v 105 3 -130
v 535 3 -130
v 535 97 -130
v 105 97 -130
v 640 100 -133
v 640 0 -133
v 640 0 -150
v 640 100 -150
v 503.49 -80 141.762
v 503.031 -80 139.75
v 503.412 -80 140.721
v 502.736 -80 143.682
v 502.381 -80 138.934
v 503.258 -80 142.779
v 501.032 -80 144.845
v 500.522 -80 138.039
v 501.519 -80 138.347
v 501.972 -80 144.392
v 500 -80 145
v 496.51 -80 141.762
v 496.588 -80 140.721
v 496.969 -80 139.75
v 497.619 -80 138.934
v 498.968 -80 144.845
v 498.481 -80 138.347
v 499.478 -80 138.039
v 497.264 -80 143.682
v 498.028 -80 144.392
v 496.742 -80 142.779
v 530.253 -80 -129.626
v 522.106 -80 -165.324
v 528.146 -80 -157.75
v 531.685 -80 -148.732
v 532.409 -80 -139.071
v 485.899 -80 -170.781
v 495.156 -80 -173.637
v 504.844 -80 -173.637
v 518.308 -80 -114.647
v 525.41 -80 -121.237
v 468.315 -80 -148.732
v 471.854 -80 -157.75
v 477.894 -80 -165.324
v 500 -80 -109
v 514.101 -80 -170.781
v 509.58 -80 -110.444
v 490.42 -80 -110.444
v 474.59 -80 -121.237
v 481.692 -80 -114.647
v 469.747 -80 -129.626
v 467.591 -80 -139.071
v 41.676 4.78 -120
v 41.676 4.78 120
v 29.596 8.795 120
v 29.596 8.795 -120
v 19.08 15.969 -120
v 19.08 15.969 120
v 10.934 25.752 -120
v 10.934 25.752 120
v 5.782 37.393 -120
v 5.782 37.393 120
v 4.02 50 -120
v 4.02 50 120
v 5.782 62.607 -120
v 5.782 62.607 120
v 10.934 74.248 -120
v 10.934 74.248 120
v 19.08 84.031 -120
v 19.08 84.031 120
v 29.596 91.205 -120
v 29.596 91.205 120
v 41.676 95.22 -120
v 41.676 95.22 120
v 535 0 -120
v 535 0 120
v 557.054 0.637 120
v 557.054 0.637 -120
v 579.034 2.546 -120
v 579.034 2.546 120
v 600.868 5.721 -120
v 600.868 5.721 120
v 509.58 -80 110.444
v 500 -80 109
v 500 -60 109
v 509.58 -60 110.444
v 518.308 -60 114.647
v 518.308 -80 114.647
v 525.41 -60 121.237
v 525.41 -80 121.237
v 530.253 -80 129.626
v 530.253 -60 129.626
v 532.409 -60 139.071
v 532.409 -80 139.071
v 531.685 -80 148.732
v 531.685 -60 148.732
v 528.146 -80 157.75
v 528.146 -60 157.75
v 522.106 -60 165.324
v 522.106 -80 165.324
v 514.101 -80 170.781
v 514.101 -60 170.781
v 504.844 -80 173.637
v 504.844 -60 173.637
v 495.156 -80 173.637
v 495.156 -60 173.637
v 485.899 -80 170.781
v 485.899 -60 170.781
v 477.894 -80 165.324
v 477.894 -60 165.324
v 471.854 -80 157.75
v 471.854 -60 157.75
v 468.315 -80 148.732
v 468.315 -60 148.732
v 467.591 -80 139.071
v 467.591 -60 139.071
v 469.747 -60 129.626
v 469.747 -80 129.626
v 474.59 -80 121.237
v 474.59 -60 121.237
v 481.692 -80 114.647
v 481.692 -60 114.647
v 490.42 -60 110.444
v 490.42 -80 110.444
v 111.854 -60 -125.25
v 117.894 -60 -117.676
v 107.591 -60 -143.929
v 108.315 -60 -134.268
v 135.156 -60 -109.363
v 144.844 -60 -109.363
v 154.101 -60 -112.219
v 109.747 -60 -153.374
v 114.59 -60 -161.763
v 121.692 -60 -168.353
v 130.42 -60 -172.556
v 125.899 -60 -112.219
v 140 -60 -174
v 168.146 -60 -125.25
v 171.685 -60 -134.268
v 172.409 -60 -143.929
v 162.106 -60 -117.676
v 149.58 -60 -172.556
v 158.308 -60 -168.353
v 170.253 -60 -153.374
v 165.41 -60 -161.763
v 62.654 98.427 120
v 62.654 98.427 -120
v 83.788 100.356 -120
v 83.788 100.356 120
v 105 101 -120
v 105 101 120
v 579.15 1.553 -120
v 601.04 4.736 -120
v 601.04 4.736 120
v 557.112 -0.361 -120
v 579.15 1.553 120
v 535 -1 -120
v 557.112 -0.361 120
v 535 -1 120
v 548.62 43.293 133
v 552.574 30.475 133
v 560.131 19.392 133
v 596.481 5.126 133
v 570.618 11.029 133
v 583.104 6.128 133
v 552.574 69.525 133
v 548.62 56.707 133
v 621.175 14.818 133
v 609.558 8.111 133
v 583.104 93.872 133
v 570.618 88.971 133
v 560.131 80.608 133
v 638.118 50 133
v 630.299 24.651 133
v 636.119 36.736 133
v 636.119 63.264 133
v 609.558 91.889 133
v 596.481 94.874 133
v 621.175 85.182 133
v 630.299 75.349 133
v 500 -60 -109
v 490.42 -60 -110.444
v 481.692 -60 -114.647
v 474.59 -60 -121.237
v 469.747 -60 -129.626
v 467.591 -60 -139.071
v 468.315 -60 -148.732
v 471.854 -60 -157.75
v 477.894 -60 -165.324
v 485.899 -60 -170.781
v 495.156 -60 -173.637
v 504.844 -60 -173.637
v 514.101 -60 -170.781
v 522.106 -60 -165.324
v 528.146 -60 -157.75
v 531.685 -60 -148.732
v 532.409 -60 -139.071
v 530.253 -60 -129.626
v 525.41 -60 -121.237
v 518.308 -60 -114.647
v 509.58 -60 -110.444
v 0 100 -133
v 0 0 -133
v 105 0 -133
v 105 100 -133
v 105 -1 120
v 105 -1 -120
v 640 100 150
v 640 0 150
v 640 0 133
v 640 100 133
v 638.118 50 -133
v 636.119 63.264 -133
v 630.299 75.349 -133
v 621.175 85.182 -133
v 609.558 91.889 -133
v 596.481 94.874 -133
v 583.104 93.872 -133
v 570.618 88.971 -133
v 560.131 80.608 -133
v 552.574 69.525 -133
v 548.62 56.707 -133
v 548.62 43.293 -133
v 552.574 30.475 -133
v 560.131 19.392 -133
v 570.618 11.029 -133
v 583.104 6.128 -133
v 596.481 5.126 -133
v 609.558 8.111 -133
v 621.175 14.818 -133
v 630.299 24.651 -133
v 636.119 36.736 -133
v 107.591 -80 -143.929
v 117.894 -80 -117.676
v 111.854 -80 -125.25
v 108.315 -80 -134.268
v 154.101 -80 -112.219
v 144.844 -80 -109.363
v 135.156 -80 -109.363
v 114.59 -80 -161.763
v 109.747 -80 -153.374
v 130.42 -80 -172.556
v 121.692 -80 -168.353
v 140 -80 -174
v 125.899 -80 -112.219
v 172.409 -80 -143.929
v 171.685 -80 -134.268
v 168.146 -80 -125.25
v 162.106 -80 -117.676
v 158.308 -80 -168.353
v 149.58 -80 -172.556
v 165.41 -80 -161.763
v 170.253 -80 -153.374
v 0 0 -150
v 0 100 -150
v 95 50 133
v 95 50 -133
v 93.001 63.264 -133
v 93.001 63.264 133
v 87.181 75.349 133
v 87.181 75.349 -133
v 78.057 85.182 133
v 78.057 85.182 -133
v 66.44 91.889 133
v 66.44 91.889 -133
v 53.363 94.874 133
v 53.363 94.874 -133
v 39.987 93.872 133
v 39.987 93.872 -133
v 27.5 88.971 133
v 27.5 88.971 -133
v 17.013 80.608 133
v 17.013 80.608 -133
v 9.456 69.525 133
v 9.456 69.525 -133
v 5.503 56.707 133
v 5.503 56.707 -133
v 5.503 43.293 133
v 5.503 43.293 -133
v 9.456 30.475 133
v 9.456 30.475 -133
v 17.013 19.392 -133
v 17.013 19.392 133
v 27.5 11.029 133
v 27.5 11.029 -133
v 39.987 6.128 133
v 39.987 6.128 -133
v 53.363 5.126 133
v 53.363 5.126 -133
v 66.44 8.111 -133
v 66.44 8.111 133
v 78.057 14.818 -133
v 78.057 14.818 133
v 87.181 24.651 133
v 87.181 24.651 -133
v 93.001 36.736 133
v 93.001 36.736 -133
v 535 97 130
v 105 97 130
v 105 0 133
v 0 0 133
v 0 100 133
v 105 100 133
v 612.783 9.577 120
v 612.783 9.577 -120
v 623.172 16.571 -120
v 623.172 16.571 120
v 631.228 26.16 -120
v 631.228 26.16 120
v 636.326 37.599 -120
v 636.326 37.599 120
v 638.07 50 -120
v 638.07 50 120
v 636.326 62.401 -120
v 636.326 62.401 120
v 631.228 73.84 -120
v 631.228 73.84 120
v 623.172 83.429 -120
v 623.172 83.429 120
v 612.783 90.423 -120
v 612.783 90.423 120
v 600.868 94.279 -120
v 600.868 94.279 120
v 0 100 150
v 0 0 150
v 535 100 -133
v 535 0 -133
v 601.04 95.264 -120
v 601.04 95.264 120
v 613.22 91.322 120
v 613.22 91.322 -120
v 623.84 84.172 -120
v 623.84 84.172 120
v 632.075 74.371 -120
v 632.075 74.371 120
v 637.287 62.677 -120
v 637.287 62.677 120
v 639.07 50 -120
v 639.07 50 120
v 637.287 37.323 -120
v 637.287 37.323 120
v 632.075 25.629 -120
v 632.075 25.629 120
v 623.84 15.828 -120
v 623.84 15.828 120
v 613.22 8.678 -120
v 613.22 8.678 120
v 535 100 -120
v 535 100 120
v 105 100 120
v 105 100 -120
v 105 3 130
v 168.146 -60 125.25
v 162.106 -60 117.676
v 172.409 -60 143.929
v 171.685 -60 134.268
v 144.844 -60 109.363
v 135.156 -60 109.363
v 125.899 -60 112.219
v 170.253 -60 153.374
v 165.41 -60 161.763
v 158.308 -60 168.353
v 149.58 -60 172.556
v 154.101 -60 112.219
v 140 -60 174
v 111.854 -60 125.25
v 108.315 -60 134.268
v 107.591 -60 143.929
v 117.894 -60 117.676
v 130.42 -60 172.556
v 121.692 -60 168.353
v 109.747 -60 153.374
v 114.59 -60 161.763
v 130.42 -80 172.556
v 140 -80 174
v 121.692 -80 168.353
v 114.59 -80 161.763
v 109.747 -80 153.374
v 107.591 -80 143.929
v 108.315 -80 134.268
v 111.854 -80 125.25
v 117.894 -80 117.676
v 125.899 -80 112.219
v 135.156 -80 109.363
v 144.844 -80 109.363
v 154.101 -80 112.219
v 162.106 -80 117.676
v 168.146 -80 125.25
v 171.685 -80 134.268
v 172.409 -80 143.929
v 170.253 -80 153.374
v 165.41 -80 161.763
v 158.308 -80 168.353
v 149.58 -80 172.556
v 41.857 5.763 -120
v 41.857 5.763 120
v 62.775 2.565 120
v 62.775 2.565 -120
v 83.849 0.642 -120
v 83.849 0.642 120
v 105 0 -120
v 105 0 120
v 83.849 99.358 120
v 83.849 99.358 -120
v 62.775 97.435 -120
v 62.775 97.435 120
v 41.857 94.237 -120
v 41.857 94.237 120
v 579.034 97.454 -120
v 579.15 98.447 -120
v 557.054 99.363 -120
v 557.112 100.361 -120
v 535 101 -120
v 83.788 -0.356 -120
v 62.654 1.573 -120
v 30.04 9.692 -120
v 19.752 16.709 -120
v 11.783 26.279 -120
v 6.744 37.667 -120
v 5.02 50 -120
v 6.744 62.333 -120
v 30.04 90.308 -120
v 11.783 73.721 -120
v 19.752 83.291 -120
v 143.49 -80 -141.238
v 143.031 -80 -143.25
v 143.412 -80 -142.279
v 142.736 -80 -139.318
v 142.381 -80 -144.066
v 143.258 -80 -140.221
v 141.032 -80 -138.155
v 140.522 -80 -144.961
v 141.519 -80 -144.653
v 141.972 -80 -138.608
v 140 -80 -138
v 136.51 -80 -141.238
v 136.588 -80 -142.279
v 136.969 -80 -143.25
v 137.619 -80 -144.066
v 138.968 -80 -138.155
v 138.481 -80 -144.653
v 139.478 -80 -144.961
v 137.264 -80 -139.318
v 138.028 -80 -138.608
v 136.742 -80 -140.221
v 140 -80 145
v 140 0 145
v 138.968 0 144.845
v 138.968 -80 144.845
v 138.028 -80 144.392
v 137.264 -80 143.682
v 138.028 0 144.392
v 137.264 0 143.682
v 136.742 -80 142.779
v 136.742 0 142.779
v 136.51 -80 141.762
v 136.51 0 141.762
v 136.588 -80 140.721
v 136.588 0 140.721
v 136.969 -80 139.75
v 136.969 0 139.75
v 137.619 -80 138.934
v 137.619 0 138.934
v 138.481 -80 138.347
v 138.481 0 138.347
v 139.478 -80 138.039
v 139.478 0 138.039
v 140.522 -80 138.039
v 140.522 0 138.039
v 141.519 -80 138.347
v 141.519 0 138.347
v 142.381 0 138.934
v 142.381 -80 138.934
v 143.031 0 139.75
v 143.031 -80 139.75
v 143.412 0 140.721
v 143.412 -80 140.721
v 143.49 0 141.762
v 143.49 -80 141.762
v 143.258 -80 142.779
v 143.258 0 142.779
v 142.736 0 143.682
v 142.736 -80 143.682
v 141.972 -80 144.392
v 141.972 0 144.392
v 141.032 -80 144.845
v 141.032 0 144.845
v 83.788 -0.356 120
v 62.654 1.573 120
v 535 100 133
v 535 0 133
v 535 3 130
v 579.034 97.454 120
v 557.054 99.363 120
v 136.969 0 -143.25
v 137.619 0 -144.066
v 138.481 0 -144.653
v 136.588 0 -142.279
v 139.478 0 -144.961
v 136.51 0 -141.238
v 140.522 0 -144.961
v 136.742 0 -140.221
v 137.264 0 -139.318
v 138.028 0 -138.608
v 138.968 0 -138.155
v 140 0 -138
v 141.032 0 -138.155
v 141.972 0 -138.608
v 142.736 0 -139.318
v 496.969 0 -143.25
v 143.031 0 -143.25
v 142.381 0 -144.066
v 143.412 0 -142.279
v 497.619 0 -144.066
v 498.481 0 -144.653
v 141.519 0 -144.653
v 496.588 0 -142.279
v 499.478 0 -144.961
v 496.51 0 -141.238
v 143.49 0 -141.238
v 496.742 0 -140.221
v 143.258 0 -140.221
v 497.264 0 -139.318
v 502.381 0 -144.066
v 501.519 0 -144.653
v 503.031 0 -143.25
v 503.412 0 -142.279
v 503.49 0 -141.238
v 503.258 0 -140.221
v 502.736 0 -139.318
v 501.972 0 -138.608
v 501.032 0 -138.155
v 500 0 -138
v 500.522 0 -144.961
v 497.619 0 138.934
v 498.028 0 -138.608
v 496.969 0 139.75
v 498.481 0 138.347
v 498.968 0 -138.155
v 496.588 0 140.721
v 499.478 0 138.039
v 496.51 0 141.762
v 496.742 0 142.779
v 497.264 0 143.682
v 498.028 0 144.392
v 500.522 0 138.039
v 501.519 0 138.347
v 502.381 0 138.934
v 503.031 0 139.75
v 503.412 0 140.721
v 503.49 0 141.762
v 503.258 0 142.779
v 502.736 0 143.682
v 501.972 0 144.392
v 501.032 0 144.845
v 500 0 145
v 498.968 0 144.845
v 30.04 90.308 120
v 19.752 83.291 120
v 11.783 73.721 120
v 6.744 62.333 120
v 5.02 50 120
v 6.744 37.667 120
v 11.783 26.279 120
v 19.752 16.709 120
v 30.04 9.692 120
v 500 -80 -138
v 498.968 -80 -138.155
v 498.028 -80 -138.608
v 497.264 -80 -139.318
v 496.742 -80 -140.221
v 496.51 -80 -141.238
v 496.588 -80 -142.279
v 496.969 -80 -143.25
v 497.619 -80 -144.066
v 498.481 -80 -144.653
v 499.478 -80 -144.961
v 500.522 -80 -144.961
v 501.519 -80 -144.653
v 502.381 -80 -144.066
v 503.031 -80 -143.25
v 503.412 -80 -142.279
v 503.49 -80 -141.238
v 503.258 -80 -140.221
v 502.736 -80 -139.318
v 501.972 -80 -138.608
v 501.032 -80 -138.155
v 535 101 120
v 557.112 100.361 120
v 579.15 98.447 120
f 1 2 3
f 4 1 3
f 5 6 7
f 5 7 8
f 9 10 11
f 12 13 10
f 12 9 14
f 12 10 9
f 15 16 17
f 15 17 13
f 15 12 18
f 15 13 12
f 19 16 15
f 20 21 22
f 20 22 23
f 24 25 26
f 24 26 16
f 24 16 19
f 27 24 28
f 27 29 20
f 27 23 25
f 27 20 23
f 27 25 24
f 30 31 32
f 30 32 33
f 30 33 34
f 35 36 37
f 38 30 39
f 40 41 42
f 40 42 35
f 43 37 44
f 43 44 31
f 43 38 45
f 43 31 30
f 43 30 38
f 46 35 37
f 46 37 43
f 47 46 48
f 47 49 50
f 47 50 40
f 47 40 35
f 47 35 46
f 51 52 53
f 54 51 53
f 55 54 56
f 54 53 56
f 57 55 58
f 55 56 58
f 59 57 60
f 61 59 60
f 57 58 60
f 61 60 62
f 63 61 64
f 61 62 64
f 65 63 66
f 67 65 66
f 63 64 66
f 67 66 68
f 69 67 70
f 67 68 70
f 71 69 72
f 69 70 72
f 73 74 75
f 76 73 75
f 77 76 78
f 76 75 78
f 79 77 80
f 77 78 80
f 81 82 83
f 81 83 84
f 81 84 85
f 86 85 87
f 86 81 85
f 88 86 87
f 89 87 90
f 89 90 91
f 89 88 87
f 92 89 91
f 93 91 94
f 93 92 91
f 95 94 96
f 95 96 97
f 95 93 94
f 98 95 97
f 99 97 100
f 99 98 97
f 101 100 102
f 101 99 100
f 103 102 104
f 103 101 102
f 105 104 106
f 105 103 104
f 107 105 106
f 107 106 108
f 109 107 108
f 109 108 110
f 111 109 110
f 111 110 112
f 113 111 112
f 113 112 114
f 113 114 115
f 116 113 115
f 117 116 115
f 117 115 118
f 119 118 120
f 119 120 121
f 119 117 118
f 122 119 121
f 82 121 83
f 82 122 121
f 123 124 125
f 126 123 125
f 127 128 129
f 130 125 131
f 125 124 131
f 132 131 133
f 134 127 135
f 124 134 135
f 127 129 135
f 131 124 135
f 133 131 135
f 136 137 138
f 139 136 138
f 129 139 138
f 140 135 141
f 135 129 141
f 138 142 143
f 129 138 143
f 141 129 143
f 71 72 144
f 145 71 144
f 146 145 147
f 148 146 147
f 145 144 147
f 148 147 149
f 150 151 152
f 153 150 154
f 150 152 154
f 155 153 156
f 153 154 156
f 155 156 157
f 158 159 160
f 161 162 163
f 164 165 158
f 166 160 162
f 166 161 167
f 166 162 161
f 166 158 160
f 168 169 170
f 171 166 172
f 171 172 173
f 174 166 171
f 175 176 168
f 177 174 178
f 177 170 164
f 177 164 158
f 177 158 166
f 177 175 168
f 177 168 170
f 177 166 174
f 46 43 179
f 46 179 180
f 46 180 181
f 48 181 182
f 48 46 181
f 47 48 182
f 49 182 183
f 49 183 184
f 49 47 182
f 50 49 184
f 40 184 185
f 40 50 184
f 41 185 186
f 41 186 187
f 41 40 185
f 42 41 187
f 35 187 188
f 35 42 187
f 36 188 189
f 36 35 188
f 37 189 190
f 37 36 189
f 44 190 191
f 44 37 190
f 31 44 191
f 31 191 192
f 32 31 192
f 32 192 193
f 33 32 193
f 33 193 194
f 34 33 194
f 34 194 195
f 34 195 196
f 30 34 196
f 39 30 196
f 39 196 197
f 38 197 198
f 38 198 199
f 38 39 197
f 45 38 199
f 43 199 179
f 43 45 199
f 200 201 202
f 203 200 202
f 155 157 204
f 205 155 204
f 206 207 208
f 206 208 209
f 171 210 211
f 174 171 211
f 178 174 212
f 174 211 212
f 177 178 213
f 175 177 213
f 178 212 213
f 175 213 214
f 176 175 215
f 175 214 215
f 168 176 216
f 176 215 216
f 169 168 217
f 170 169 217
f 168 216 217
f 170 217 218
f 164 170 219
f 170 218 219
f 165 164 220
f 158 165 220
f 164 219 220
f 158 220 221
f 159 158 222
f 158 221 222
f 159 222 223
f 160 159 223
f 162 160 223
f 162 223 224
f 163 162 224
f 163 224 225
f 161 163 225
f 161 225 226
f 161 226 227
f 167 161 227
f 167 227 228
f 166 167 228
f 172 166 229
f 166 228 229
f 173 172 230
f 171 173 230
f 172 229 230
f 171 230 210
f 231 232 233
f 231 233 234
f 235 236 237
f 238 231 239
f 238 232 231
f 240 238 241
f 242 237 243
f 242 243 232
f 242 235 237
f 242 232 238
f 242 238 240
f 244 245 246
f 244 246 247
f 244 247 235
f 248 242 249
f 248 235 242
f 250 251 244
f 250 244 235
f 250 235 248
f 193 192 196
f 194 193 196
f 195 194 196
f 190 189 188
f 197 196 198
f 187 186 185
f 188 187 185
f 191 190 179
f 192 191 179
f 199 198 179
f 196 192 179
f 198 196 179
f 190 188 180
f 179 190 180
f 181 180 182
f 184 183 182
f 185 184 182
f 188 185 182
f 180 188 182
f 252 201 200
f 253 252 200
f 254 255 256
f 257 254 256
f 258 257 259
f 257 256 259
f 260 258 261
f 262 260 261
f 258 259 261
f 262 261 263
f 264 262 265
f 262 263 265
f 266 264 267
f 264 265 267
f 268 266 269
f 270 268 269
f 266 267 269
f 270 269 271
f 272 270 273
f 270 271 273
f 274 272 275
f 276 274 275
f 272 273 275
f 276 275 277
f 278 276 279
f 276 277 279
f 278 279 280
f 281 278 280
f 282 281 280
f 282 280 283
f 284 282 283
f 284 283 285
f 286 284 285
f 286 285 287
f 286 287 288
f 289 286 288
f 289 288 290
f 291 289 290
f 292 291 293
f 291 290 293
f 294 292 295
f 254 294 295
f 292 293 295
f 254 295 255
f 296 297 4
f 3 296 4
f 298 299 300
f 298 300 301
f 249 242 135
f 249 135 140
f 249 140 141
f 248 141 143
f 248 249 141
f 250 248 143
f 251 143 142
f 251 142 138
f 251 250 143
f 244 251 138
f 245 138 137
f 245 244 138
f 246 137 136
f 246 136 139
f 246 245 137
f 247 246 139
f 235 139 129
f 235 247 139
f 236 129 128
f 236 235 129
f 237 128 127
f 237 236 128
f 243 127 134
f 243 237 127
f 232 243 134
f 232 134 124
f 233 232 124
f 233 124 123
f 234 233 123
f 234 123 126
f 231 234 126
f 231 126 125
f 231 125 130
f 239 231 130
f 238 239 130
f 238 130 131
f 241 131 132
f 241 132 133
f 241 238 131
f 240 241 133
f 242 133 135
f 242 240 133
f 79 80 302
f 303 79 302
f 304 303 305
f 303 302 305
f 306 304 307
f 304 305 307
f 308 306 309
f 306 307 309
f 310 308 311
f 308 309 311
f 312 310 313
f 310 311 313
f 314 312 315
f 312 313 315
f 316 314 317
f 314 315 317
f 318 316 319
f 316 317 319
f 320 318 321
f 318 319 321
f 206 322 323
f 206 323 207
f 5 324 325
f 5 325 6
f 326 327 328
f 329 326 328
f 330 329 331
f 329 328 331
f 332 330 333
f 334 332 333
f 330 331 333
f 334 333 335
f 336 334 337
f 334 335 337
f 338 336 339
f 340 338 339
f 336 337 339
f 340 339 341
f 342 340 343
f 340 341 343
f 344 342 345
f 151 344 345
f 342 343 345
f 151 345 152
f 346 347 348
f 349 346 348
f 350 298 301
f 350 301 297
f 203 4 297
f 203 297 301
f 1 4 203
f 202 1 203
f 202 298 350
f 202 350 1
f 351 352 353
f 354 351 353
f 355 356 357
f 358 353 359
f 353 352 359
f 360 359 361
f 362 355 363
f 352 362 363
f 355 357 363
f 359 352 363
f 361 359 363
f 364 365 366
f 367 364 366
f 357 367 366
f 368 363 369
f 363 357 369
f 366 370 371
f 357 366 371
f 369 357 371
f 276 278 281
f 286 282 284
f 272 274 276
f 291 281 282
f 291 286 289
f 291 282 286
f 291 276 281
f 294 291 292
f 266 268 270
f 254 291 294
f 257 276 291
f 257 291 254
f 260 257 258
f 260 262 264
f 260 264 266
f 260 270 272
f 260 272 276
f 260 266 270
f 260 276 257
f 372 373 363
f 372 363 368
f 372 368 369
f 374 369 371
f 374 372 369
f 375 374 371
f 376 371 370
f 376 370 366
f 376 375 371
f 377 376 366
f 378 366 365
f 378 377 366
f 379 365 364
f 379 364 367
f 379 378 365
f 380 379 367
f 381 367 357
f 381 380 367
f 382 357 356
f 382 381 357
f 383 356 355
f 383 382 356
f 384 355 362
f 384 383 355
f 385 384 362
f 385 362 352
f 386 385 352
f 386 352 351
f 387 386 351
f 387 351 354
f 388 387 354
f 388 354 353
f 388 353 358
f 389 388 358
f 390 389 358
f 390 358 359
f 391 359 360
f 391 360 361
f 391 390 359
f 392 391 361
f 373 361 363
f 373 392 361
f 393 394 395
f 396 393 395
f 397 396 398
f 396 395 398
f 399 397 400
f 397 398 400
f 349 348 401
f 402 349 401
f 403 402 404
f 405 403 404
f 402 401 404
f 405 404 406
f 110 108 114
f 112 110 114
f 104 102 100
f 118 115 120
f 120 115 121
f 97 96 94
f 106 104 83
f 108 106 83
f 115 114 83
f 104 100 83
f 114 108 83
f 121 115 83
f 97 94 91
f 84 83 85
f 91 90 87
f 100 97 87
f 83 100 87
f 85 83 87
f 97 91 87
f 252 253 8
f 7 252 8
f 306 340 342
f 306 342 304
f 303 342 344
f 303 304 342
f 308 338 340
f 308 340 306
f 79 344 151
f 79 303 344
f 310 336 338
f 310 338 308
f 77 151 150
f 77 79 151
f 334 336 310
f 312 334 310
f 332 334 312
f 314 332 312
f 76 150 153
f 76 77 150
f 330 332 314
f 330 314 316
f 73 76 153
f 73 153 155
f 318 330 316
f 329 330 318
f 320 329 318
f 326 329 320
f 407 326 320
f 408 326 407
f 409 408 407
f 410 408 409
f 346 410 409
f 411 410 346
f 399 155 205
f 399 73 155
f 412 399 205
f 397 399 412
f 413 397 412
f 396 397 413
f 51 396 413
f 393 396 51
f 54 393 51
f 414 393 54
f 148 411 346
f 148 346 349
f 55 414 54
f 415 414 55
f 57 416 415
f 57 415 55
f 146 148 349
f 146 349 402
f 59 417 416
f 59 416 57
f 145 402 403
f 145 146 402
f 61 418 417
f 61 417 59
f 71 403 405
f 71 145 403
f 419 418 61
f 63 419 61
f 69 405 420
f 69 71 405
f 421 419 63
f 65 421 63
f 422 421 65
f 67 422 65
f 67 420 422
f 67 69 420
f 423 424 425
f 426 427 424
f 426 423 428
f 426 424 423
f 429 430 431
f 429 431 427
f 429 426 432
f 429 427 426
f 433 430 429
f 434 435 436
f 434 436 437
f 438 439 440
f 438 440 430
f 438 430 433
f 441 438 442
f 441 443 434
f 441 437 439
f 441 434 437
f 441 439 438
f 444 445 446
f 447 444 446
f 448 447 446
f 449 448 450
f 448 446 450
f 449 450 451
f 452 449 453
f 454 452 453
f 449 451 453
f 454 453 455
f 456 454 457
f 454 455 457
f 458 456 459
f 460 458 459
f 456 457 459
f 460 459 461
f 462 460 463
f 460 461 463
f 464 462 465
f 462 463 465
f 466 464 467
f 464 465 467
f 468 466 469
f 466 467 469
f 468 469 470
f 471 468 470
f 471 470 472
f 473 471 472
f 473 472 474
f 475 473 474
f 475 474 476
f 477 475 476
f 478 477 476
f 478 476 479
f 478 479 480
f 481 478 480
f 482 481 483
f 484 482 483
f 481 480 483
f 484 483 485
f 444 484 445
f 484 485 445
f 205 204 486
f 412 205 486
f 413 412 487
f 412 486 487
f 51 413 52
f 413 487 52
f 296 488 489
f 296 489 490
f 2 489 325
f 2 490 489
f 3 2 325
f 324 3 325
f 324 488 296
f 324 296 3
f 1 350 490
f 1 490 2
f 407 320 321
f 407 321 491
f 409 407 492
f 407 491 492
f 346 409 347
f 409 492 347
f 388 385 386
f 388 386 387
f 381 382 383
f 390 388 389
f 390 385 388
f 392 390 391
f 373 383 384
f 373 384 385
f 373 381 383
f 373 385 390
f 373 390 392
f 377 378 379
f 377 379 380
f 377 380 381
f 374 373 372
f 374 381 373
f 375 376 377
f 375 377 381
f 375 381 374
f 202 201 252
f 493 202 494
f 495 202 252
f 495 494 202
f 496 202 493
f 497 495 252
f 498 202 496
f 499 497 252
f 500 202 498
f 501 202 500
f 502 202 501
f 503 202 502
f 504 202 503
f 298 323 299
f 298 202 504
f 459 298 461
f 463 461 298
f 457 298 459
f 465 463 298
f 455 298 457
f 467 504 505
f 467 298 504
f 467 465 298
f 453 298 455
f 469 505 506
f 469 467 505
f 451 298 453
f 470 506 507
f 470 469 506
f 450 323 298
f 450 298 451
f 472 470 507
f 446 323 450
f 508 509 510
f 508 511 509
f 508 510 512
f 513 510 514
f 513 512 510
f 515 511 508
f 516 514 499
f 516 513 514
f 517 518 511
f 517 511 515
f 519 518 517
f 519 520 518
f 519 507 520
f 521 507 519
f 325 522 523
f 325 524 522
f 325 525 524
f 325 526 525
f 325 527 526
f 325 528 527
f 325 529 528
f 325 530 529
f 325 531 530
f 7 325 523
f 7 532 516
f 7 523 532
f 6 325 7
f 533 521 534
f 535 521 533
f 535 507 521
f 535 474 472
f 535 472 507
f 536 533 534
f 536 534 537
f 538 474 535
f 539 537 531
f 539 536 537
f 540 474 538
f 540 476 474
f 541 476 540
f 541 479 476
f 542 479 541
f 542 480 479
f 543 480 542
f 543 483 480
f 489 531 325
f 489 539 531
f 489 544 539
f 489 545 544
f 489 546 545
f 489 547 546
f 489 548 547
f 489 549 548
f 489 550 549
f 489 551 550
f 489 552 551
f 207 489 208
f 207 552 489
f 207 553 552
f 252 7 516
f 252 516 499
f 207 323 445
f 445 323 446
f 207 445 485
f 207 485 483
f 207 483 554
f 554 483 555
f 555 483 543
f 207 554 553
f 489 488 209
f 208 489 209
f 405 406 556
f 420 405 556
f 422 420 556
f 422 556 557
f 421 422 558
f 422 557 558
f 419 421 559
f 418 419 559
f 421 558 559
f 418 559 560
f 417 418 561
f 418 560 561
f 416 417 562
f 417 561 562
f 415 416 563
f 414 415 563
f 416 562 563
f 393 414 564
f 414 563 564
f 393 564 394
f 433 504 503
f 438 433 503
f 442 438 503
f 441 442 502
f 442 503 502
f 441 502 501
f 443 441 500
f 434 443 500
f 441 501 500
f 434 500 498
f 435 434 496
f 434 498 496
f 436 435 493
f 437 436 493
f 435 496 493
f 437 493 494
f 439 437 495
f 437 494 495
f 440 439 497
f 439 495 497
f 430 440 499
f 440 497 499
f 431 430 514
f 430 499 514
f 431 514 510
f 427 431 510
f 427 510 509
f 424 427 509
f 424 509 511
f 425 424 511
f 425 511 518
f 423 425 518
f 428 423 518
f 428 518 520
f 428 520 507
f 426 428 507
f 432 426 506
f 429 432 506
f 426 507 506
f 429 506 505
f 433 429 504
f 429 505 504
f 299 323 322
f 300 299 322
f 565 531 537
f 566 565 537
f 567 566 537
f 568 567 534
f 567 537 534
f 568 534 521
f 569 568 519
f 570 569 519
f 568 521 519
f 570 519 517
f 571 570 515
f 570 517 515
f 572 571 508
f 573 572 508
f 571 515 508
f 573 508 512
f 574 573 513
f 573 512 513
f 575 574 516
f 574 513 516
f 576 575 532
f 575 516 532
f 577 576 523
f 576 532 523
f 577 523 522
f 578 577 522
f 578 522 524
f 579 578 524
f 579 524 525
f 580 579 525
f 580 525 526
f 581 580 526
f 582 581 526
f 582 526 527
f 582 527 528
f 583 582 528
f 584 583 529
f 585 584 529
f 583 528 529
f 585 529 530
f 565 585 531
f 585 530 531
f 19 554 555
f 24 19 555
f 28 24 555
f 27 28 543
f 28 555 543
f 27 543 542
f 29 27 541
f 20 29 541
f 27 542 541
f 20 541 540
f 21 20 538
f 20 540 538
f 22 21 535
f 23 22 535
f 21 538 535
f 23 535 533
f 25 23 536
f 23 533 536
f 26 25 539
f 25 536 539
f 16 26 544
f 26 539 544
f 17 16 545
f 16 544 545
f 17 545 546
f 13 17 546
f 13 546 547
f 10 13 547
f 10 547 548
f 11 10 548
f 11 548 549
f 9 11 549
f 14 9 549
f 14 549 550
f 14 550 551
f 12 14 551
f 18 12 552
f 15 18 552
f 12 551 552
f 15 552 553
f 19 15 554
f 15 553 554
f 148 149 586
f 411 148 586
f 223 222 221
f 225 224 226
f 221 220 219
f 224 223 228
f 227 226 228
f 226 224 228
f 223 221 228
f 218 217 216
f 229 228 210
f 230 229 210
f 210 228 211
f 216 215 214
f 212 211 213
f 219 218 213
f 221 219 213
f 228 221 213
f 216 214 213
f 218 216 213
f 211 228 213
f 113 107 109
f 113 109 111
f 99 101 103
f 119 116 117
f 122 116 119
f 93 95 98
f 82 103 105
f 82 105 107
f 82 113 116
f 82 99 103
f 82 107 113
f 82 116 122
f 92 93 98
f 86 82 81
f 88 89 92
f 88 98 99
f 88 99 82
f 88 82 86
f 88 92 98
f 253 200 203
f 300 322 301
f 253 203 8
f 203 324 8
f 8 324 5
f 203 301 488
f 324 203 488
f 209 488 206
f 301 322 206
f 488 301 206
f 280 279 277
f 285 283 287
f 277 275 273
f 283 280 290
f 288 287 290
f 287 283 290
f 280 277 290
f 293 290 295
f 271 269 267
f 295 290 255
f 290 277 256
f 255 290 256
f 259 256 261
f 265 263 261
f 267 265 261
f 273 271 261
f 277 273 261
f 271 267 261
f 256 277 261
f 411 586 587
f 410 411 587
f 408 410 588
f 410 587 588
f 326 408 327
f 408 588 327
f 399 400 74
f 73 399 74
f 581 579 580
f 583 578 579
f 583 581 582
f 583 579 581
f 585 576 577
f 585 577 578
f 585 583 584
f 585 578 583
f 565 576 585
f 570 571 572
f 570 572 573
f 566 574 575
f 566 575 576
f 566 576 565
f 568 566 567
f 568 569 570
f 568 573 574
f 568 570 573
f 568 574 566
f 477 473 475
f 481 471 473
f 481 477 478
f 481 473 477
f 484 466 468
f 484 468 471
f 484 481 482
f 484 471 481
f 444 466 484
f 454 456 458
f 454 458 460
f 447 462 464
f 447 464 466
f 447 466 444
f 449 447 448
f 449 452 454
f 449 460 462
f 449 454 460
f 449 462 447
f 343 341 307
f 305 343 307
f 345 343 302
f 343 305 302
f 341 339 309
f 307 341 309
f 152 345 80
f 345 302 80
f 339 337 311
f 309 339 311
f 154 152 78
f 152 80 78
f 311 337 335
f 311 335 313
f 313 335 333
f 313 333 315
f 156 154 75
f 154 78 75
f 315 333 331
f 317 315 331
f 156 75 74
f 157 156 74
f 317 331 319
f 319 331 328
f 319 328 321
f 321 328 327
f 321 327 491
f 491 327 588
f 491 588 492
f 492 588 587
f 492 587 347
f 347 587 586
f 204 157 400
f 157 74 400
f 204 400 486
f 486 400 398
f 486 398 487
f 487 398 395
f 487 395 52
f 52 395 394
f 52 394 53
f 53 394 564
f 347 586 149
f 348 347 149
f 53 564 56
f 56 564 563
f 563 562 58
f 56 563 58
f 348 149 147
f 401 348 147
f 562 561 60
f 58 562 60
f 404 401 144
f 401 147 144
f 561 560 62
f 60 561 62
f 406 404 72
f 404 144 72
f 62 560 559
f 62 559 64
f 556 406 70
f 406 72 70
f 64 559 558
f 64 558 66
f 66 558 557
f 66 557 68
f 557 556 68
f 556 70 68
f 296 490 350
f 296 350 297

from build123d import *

# Parameters (mm, degrees)
CROQUIS1_W                = 640
CROQUIS1_H                = 100
SALIENTE_EXTRUIR1_DEPTH   = 150
CROQUIS2_W                = 105
CROQUIS2_H                = 266
CORTAR_EXTRUIR1_DEPTH     = 150
CROQUIS4_W                = 260
CROQUIS4_H                = 94
CORTAR_EXTRUIR2_DEPTH     = 565.557348726
CROQUIS5_R                = 3.5
SALIENTE_EXTRUIR2_DEPTH   = 80
CROQUIS6_R                = 32.5
SALIENTE_EXTRUIR3_DEPTH   = 20
SALIENTE_EXTRUIR3_2_DEPTH = 20
SALIENTE_EXTRUIR3_3_DEPTH = 20
SALIENTE_EXTRUIR3_4_DEPTH = 20
CROQUIS7_R                = 45
SALIENTE_EXTRUIR4_DEPTH   = 266
SALIENTE_EXTRUIR4_2_DEPTH = 266
SALIENTE_EXTRUIR6_START   = -30
SALIENTE_EXTRUIR6_DEPTH   = 240


with BuildPart() as part:
    # Croquis1 → Saliente-Extruir1 (new, symmetric)
    with BuildSketch(Plane.XY):
        with Locations((320, 50)):
            Rectangle(CROQUIS1_W, CROQUIS1_H)
    extrude(amount=SALIENTE_EXTRUIR1_DEPTH, both=True)

    # Croquis2 → Cortar-Extruir1 (cut, symmetric)
    with BuildSketch(Plane(origin=(0, 100, 0), x_dir=(1, 0, 0), z_dir=(0, 1, 0))):
        with Locations((52.5, 0)):
            Rectangle(CROQUIS2_W, CROQUIS2_H)
        with Locations((587.5, 0)):
            Rectangle(CROQUIS2_W, CROQUIS2_H)
    extrude(amount=CORTAR_EXTRUIR1_DEPTH, both=True, mode=Mode.SUBTRACT)

    # Croquis4 → Cortar-Extruir2 (cut, through all)
    with BuildSketch(Plane(origin=(535, 0, 0), x_dir=(0, 0, -1), z_dir=(1, 0, 0))):
        with Locations((0, 50)):
            Rectangle(CROQUIS4_W, CROQUIS4_H)
    extrude(amount=-CORTAR_EXTRUIR2_DEPTH, mode=Mode.SUBTRACT)

    # Croquis5 → Saliente-Extruir2 (add)
    with BuildSketch(Plane.XZ):
        with Locations(Location((140, 141.5, 0), (0, 0, 90))):
            Circle(CROQUIS5_R)
        with Locations(Location((140, -141.5, 0), (0, 0, 90))):
            Circle(CROQUIS5_R)
        with Locations(Location((500, -141.5, 0), (0, 0, 90))):
            Circle(CROQUIS5_R)
        with Locations(Location((500, 141.5, 0), (0, 0, 90))):
            Circle(CROQUIS5_R)
    extrude(amount=SALIENTE_EXTRUIR2_DEPTH)


with BuildPart() as body_2:
    # Croquis6 → Saliente-Extruir3 (new body)
    with BuildSketch(Plane.XZ.offset(80)):
        with Locations(Location((500, 141.5, 0), (0, 0, 270))):
            Circle(CROQUIS6_R)
    extrude(amount=-SALIENTE_EXTRUIR3_DEPTH)


with BuildPart() as body_3:
    # Croquis6 → Saliente-Extruir3 2 (new body)
    with BuildSketch(Plane.XZ.offset(80)):
        with Locations(Location((140, 141.5, 0), (0, 0, 90))):
            Circle(CROQUIS6_R)
    extrude(amount=-SALIENTE_EXTRUIR3_2_DEPTH)


with BuildPart() as body_4:
    # Croquis6 → Saliente-Extruir3 3 (new body)
    with BuildSketch(Plane.XZ.offset(80)):
        with Locations(Location((140, -141.5, 0), (0, 0, 270))):
            Circle(CROQUIS6_R)
    extrude(amount=-SALIENTE_EXTRUIR3_3_DEPTH)


with BuildPart() as body_5:
    # Croquis6 → Saliente-Extruir3 4 (new body)
    with BuildSketch(Plane.XZ.offset(80)):
        with Locations(Location((500, -141.5, 0), (0, 0, 90))):
            Circle(CROQUIS6_R)
    extrude(amount=-SALIENTE_EXTRUIR3_4_DEPTH)


with BuildPart() as body_6:
    # Croquis7 → Saliente-Extruir4 (new body)
    with BuildSketch(Plane.XY.offset(-133)):
        with Locations((593.117873857, 50)):
            Circle(CROQUIS7_R)
    extrude(amount=SALIENTE_EXTRUIR4_DEPTH)


with BuildPart() as body_7:
    # Croquis7 → Saliente-Extruir4 2 (new body)
    with BuildSketch(Plane.XY.offset(-133)):
        with Locations((50, 50)):
            Circle(CROQUIS7_R)
    extrude(amount=SALIENTE_EXTRUIR4_2_DEPTH)


with BuildPart() as body_8:
    # Croquis9 → Saliente-Extruir6 (new body)
    with BuildSketch(Plane.XY.offset(150).offset(SALIENTE_EXTRUIR6_START)):
        with BuildLine():
            Line((105, 101), (535, 101))
            ThreePointArc((535, 101), (568.144454941, 99.563357978), (601.040292744, 95.264208189))
            ThreePointArc((601.040292744, 95.264208189), (639.070167206, 50), (601.040292744, 4.735791811))
            ThreePointArc((601.040292744, 4.735791811), (568.144454941, 0.436642022), (535, -1))
            Line((535, -1), (105, -1))
            ThreePointArc((105, -1), (73.206254675, 0.447973976), (41.675742122, 4.779907567))
            ThreePointArc((41.675742122, 4.779907567), (4.020112779, 50), (41.675742122, 95.220092433))
            ThreePointArc((41.675742122, 95.220092433), (73.206254675, 99.552026024), (105, 101))
        make_face()
        with BuildLine():
            Line((105, 0), (535, 0))
            ThreePointArc((535, 0), (568.057927771, 1.432891513), (600.867887445, 5.720817908))
            ThreePointArc((600.867887445, 5.720817908), (638.070167206, 50), (600.867887445, 94.279182092))
            ThreePointArc((600.867887445, 94.279182092), (568.057927771, 98.567108487), (535, 100))
            Line((535, 100), (105, 100))
            ThreePointArc((105, 100), (73.297151603, 98.556165718), (41.856783407, 94.236616936))
            ThreePointArc((41.856783407, 94.236616936), (5.020112779, 50), (41.856783407, 5.763383064))
            ThreePointArc((41.856783407, 5.763383064), (73.297151603, 1.443834282), (105, 0))
        make_face(mode=Mode.SUBTRACT)
    extrude(amount=-SALIENTE_EXTRUIR6_DEPTH)


solid = Compound([part.part, body_2.part, body_3.part, body_4.part, body_5.part, body_6.part, body_7.part, body_8.part])
